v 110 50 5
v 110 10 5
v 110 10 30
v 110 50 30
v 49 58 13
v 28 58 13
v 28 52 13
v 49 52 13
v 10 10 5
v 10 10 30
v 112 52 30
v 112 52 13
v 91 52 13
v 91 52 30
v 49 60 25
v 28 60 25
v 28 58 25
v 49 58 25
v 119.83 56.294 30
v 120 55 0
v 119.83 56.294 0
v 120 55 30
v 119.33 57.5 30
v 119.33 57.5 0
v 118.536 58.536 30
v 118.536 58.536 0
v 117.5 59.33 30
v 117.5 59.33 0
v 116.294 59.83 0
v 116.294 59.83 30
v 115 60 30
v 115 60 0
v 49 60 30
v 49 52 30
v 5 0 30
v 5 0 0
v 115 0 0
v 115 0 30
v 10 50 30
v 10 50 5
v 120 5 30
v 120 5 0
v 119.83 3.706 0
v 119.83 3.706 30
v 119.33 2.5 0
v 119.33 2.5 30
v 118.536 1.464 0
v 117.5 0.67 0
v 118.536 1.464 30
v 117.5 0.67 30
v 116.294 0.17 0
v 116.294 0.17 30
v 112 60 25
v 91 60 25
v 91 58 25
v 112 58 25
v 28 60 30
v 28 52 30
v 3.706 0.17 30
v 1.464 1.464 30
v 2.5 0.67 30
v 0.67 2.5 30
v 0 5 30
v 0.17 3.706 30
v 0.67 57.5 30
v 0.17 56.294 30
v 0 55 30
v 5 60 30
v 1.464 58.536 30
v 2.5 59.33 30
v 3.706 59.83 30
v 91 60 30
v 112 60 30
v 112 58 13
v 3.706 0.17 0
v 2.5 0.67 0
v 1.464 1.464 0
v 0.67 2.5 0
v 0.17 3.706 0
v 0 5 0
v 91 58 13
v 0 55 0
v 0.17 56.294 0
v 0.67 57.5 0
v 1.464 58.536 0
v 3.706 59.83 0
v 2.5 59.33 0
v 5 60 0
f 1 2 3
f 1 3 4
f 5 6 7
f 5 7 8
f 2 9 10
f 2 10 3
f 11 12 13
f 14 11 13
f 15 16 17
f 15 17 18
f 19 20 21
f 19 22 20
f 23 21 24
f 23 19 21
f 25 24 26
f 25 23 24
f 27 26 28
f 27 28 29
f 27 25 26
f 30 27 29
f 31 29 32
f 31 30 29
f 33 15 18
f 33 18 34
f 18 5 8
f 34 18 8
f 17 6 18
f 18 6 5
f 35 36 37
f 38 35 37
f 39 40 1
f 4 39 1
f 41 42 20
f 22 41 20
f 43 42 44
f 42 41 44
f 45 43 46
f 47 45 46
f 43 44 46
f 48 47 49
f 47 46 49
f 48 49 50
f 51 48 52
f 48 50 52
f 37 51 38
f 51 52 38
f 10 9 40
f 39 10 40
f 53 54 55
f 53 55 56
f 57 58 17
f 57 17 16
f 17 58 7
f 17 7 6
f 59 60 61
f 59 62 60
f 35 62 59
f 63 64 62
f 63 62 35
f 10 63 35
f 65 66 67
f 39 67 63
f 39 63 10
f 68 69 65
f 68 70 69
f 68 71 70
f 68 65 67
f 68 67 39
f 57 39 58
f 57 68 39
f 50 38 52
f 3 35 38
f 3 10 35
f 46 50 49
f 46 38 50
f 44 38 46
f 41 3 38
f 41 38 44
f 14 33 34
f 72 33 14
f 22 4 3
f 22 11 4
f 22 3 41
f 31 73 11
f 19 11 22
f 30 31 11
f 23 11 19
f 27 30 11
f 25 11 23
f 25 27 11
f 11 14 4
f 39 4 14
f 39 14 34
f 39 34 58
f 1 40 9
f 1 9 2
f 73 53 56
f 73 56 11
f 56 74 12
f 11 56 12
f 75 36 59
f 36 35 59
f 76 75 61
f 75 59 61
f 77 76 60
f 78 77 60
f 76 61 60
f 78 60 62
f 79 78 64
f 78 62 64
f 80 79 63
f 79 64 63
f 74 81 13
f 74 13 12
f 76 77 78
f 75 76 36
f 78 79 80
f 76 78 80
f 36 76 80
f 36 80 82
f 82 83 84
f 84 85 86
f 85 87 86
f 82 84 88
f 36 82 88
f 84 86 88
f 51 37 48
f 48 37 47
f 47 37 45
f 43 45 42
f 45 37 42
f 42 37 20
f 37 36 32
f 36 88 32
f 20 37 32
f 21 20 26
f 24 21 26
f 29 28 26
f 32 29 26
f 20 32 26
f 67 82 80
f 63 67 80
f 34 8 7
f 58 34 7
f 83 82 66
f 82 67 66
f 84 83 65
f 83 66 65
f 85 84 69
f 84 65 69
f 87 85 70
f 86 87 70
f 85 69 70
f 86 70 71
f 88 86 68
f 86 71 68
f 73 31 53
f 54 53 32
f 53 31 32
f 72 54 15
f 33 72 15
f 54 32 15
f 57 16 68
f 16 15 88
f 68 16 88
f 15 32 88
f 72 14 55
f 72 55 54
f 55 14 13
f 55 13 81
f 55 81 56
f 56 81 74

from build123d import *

# Parameters (mm, degrees)
F0_W     = 100
F0_H     = 40
F1_DEPTH = 30
F2_DEPTH = 5
F0_W_2   = 21
F0_H_2   = 6
F3_DEPTH = 13
F0_H_3   = 2
F4_DEPTH = 25
F5_R     = 5


with BuildPart() as f1:
    # F0 (on Top) → F1 (new body)
    with BuildSketch(Plane.XY):
        Polygon((0, 60), (0, 0), (120, 0), (120, 60), (112, 60), (112, 58), (112, 52), (91, 52), (91, 58), (91, 60), (49, 60), (49, 58), (49, 52), (28, 52), (28, 58), (28, 60), align=None)
        with Locations((60, 30)):
            Rectangle(F0_W, F0_H, mode=Mode.SUBTRACT)
    extrude(amount=F1_DEPTH)

    # F0 (on Top) → F2 (join)
    with BuildSketch(Plane.XY):
        with Locations((60, 30)):
            Rectangle(F0_W, F0_H)
    extrude(amount=F2_DEPTH)

    # F0 (on Top) → F3 (join)
    with BuildSketch(Plane.XY):
        with Locations((38.5, 55)):
            Rectangle(F0_W_2, F0_H_2)
        with Locations((101.5, 55)):
            Rectangle(F0_W_2, F0_H_2)
    extrude(amount=F3_DEPTH)

    # F0 (on Top) → F4 (join)
    with BuildSketch(Plane.XY):
        with Locations((38.5, 59)):
            Rectangle(F0_W_2, F0_H_3)
        with Locations((101.5, 59)):
            Rectangle(F0_W_2, F0_H_3)
    extrude(amount=F4_DEPTH)

    # F5
    f5_edges = [f1.edges().sort_by_distance(p)[0] for p in [
        (0, 0, 15),
        (120, 0, 15),
        (120, 60, 15),
        (0, 60, 15),
    ]]
    fillet(f5_edges, radius=F5_R)


solid = f1.part
